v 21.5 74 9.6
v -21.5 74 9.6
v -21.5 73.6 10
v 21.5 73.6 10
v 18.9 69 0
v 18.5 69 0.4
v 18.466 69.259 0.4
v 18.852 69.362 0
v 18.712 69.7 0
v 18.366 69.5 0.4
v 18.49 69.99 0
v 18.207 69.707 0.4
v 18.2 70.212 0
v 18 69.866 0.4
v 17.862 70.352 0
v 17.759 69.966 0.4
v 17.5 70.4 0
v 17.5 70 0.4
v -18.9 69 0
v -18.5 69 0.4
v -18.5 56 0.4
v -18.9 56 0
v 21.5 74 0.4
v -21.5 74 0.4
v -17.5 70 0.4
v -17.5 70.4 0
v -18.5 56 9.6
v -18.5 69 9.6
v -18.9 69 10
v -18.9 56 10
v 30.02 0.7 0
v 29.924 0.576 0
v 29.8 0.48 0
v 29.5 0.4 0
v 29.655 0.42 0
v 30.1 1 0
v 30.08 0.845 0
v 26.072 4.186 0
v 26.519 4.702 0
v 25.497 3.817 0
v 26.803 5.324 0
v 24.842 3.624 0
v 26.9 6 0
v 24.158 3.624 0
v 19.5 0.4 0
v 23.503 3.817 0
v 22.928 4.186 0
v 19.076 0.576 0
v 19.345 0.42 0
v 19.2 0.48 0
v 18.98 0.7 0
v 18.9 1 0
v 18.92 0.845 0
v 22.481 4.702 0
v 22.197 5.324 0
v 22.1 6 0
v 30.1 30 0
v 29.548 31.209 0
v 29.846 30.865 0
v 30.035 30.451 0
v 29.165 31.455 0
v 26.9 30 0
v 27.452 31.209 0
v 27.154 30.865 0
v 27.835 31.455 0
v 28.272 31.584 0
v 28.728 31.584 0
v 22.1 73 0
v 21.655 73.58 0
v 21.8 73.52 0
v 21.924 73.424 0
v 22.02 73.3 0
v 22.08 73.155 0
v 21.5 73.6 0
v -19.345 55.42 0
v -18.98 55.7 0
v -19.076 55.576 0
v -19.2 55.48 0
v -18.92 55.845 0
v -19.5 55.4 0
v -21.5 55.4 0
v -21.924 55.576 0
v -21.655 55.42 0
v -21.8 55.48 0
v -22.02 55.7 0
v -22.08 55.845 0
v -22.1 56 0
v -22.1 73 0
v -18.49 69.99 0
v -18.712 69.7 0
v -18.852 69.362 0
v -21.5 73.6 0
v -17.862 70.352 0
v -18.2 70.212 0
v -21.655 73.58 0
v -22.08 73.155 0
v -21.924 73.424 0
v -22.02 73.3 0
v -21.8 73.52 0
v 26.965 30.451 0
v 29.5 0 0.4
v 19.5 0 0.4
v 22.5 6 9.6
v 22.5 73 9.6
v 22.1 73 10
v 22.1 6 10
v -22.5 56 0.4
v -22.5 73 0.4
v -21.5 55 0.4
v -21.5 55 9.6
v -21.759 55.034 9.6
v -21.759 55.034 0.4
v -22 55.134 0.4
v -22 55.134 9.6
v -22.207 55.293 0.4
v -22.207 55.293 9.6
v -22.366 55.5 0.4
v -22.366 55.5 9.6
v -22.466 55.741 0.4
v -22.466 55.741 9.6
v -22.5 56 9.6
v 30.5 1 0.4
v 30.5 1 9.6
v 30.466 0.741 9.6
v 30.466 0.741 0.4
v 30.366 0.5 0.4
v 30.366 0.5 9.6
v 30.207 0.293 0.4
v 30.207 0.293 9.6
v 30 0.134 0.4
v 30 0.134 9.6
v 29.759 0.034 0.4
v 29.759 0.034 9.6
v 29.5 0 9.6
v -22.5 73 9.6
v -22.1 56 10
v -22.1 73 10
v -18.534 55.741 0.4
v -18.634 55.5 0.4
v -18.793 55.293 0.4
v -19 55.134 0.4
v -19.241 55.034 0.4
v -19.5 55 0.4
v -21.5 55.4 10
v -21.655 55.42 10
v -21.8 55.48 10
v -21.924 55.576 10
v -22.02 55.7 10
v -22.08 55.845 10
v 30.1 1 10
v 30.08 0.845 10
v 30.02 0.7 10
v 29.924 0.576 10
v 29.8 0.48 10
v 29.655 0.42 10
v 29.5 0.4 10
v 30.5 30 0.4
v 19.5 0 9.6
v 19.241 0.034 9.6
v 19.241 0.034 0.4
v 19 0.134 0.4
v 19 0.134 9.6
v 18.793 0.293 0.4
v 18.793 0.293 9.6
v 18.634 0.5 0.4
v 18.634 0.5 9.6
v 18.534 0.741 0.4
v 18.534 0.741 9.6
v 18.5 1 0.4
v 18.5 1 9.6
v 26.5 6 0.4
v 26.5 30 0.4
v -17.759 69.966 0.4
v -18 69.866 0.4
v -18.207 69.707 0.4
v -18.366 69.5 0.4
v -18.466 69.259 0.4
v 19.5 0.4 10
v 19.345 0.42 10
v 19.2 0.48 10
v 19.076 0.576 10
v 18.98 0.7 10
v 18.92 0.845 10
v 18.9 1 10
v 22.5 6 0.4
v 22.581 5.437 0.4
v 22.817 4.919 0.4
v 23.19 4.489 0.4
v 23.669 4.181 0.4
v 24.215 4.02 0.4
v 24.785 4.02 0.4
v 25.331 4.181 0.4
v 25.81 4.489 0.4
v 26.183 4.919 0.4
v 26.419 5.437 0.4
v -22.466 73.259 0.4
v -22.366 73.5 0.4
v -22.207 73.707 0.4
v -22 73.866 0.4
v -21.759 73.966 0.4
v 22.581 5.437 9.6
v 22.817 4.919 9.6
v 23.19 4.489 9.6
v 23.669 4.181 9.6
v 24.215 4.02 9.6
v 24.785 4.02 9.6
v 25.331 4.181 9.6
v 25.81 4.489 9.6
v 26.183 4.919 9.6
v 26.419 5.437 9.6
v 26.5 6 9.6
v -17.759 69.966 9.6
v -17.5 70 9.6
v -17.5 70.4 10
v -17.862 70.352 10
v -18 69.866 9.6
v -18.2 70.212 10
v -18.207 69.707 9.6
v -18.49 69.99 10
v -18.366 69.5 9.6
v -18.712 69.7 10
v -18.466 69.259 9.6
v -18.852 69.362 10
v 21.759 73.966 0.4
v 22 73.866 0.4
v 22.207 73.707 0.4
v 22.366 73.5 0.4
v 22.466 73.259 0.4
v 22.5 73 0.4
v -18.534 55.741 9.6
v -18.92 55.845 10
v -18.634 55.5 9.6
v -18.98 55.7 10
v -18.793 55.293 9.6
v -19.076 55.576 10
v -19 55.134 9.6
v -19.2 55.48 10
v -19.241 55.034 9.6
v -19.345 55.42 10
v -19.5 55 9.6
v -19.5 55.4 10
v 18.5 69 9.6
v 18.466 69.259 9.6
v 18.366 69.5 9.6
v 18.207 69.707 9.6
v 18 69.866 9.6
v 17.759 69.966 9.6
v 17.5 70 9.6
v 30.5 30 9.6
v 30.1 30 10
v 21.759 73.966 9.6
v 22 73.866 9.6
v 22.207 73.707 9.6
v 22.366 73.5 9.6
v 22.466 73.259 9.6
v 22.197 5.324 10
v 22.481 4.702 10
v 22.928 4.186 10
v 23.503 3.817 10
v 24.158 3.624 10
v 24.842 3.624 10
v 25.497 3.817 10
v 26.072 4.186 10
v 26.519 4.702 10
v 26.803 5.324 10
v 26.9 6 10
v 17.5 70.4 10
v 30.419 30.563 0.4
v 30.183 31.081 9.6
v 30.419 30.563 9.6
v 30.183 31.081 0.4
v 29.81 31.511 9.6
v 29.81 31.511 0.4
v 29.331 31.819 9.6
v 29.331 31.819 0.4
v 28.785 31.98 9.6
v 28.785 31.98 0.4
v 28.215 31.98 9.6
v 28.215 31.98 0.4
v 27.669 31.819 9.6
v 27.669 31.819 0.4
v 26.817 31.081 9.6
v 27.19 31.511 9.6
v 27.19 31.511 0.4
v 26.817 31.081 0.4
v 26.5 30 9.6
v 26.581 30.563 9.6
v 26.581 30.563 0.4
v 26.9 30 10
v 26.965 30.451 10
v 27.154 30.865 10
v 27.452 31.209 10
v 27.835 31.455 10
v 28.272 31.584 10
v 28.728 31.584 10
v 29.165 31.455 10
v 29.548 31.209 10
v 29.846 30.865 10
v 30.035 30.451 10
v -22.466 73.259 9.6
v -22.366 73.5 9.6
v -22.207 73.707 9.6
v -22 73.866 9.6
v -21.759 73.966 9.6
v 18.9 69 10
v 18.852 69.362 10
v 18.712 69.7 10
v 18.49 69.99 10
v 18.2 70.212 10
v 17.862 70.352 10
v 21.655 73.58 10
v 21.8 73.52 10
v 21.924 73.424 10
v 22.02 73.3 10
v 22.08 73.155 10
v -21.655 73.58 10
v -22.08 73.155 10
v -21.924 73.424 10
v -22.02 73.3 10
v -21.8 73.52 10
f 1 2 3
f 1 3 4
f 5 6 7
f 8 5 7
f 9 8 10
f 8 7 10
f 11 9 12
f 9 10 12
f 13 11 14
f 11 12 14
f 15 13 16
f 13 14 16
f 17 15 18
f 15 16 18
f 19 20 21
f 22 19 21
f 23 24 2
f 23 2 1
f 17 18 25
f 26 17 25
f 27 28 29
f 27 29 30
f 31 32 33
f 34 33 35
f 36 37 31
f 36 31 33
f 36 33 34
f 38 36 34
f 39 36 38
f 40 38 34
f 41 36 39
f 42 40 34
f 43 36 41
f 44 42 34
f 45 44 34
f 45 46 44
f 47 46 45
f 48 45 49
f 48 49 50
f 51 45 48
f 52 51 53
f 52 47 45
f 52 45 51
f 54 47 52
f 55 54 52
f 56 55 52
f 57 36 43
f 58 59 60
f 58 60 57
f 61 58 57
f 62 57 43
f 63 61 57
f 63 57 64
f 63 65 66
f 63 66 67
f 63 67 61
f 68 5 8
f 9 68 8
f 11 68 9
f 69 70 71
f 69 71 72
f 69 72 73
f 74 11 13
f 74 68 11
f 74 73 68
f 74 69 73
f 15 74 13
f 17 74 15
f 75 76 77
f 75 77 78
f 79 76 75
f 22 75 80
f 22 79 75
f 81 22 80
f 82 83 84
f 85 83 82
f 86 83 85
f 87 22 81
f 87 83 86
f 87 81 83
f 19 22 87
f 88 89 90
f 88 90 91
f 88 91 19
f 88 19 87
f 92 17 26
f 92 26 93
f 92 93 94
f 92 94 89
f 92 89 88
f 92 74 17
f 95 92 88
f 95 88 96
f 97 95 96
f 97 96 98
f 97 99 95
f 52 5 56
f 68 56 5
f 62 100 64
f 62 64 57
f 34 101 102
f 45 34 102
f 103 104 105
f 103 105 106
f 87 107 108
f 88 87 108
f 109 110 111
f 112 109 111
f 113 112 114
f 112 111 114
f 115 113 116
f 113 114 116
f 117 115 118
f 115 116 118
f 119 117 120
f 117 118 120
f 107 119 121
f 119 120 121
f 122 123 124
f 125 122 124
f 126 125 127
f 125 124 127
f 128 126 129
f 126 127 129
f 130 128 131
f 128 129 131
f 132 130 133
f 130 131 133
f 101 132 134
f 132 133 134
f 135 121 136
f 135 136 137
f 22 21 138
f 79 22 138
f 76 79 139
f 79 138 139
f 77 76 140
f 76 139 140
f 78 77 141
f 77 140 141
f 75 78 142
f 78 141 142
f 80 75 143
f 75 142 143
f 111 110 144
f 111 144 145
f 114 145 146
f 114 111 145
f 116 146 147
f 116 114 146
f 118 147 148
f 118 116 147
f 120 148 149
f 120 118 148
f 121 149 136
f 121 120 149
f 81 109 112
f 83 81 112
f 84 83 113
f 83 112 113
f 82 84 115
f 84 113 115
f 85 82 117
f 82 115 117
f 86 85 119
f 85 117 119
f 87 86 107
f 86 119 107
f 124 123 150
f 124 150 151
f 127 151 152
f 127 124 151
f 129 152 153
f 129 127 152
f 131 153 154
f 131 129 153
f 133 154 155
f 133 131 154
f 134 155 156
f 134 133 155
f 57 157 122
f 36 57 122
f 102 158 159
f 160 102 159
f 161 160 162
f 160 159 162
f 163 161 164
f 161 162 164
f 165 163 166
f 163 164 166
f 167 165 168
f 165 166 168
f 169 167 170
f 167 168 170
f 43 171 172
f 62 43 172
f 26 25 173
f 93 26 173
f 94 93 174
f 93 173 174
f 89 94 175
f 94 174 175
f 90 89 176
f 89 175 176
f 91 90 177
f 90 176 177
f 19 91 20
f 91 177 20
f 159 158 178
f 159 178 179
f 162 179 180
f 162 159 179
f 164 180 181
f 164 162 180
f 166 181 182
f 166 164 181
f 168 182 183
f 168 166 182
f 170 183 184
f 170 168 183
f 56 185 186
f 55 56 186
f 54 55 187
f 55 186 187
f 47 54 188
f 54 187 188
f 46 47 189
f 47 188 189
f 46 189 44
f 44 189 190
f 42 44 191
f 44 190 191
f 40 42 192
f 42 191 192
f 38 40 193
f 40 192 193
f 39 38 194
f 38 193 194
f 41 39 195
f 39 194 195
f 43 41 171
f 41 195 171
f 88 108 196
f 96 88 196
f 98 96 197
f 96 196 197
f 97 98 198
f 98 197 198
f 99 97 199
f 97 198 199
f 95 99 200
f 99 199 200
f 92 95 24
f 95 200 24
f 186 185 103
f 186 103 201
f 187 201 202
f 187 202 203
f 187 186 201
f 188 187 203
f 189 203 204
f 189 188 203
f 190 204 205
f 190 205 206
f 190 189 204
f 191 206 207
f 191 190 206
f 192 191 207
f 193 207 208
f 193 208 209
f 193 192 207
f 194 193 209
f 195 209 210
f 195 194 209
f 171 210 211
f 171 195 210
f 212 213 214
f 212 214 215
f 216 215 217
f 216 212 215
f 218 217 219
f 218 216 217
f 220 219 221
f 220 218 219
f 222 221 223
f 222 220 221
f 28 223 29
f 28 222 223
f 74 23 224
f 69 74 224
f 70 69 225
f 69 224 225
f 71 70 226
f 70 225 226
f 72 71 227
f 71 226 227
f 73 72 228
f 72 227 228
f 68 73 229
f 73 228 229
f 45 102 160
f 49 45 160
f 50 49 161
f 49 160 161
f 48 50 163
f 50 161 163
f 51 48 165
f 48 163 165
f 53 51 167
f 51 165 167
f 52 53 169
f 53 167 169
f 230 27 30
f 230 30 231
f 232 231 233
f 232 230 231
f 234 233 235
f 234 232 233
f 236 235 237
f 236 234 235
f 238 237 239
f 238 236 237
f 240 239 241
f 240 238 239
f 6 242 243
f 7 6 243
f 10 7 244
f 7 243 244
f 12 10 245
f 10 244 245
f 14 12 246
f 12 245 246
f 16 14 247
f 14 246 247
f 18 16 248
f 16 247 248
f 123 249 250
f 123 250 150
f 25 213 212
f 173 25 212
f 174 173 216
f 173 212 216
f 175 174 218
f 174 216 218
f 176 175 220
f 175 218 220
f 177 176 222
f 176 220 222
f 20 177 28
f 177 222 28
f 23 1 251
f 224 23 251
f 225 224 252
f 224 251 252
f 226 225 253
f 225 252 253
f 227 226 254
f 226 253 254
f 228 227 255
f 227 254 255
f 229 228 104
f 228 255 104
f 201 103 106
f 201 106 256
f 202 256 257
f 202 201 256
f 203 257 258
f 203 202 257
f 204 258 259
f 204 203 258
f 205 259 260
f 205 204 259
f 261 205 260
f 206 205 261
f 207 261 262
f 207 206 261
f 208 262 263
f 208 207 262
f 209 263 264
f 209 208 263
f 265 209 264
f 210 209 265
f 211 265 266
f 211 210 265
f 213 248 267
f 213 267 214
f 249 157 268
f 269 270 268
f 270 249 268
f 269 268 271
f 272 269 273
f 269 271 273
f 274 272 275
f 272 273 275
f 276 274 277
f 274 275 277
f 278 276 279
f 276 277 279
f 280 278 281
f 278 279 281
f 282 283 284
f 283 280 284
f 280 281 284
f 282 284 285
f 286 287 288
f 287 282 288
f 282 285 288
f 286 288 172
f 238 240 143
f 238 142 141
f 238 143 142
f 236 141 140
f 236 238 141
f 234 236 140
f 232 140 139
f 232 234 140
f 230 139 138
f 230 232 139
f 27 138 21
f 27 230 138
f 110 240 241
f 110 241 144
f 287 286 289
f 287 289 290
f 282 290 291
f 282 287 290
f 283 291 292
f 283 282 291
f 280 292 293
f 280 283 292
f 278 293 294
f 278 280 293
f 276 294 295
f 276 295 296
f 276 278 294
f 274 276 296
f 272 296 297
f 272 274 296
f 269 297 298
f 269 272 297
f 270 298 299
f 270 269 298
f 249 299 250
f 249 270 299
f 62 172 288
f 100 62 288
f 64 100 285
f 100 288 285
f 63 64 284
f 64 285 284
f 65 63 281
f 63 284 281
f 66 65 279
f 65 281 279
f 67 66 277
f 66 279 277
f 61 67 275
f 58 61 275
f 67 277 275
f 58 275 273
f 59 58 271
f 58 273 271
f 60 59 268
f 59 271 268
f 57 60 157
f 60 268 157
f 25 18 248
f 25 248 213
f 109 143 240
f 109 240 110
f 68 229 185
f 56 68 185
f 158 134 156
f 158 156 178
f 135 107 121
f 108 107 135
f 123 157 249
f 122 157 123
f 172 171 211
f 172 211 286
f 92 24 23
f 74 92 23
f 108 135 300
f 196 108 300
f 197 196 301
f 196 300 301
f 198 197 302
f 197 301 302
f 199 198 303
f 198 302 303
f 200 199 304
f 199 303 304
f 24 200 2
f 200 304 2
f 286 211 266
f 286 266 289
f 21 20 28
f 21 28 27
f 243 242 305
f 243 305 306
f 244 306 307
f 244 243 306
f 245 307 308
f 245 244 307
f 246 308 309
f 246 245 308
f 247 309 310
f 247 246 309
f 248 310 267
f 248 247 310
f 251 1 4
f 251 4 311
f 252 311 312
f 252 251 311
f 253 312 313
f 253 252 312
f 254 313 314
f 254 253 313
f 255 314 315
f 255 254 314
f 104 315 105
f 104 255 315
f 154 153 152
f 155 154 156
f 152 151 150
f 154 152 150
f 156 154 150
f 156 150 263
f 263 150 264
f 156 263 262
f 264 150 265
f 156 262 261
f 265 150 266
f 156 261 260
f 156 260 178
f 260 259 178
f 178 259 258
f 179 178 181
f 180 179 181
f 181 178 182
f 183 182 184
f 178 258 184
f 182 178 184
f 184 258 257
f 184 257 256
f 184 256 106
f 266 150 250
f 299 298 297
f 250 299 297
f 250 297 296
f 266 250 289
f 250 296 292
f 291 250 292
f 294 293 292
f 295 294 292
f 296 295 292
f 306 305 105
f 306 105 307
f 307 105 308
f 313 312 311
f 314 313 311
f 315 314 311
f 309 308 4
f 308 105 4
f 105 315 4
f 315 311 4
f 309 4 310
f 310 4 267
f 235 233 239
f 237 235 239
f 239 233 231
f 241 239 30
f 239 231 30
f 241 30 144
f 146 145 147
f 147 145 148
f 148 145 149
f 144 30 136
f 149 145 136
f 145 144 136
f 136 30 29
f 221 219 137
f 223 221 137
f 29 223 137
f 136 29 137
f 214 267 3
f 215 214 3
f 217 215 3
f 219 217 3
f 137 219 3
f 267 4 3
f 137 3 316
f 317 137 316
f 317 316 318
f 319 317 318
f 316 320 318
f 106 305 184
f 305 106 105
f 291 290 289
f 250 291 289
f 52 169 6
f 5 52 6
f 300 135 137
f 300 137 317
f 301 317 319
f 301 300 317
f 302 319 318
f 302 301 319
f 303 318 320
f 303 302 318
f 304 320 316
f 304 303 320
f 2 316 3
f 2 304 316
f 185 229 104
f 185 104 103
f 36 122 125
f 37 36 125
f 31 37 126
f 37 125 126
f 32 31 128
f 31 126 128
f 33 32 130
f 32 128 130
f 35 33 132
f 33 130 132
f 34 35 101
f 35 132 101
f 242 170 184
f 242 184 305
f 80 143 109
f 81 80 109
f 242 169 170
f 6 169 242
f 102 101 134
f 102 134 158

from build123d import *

# Parameters (mm, degrees)
PAD_DEPTH    = 10
FILLET_R     = 1
CHAMFER_SIZE = 0.4


with BuildPart() as part:
    # Sketch → Pad (new body)
    with BuildSketch(Plane.XY):
        with BuildLine():
            Line((-18.5, 55), (-22.5, 55))
            Line((-22.5, 55), (-22.5, 74))
            Line((-22.5, 74), (22.5, 74))
            Line((22.5, 74), (22.5, 6))
            ThreePointArc((22.5, 6), (24.5, 4), (26.5, 6))
            Line((26.5, 6), (26.5, 30))
            ThreePointArc((30.5, 30), (28.5, 32), (26.5, 30))
            Line((30.5, 30), (30.5, 0))
            Line((30.5, 0), (18.5, 0))
            Line((18.5, 0), (18.5, 70))
            Line((18.5, 70), (-18.5, 70))
            Line((-18.5, 70), (-18.5, 55))
        make_face()
    extrude(amount=PAD_DEPTH)

    # Fillet
    fillet_edges = [part.edges().sort_by_distance(p)[0] for p in [
        (18.5, 70, 5),
        (-18.5, 55, 5),
        (-22.5, 55, 5),
        (-22.5, 74, 5),
        (22.5, 74, 5),
        (18.5, 0, 5),
        (30.5, 0, 5),
        (-18.5, 70, 5),
    ]]
    fillet(fillet_edges, radius=FILLET_R)

    # Chamfer
    chamfer_edges = [part.edges().sort_by_distance(p)[0] for p in [
        (30.5, 15.5, 10),
        (30.207107, 0.292893, 10),
        (28.5, 32, 10),
        (24.5, 0, 10),
        (26.5, 18, 10),
        (18.792893, 0.292893, 10),
        (24.5, 4, 10),
        (18.5, 35, 10),
        (22.5, 39.5, 10),
        (18.207107, 69.707107, 10),
        (22.207107, 73.707107, 10),
        (0, 70, 10),
        (0, 74, 10),
        (-18.207107, 69.707107, 10),
        (-22.207107, 73.707107, 10),
        (-18.5, 62.5, 10),
        (-22.5, 64.5, 10),
        (-18.792893, 55.292893, 10),
        (-22.207107, 55.292893, 10),
        (-20.5, 55, 10),
        (30.5, 15.5, 0),
        (30.207107, 0.292893, 0),
        (28.5, 32, 0),
        (24.5, 0, 0),
        (26.5, 18, 0),
        (18.792893, 0.292893, 0),
        (24.5, 4, 0),
        (18.5, 35, 0),
        (22.5, 39.5, 0),
        (18.207107, 69.707107, 0),
        (22.207107, 73.707107, 0),
        (0, 70, 0),
        (0, 74, 0),
        (-18.207107, 69.707107, 0),
        (-22.207107, 73.707107, 0),
        (-18.5, 62.5, 0),
        (-22.5, 64.5, 0),
        (-18.792893, 55.292893, 0),
        (-22.207107, 55.292893, 0),
        (-20.5, 55, 0),
    ]]
    chamfer(chamfer_edges, length=CHAMFER_SIZE)


solid = part.part
